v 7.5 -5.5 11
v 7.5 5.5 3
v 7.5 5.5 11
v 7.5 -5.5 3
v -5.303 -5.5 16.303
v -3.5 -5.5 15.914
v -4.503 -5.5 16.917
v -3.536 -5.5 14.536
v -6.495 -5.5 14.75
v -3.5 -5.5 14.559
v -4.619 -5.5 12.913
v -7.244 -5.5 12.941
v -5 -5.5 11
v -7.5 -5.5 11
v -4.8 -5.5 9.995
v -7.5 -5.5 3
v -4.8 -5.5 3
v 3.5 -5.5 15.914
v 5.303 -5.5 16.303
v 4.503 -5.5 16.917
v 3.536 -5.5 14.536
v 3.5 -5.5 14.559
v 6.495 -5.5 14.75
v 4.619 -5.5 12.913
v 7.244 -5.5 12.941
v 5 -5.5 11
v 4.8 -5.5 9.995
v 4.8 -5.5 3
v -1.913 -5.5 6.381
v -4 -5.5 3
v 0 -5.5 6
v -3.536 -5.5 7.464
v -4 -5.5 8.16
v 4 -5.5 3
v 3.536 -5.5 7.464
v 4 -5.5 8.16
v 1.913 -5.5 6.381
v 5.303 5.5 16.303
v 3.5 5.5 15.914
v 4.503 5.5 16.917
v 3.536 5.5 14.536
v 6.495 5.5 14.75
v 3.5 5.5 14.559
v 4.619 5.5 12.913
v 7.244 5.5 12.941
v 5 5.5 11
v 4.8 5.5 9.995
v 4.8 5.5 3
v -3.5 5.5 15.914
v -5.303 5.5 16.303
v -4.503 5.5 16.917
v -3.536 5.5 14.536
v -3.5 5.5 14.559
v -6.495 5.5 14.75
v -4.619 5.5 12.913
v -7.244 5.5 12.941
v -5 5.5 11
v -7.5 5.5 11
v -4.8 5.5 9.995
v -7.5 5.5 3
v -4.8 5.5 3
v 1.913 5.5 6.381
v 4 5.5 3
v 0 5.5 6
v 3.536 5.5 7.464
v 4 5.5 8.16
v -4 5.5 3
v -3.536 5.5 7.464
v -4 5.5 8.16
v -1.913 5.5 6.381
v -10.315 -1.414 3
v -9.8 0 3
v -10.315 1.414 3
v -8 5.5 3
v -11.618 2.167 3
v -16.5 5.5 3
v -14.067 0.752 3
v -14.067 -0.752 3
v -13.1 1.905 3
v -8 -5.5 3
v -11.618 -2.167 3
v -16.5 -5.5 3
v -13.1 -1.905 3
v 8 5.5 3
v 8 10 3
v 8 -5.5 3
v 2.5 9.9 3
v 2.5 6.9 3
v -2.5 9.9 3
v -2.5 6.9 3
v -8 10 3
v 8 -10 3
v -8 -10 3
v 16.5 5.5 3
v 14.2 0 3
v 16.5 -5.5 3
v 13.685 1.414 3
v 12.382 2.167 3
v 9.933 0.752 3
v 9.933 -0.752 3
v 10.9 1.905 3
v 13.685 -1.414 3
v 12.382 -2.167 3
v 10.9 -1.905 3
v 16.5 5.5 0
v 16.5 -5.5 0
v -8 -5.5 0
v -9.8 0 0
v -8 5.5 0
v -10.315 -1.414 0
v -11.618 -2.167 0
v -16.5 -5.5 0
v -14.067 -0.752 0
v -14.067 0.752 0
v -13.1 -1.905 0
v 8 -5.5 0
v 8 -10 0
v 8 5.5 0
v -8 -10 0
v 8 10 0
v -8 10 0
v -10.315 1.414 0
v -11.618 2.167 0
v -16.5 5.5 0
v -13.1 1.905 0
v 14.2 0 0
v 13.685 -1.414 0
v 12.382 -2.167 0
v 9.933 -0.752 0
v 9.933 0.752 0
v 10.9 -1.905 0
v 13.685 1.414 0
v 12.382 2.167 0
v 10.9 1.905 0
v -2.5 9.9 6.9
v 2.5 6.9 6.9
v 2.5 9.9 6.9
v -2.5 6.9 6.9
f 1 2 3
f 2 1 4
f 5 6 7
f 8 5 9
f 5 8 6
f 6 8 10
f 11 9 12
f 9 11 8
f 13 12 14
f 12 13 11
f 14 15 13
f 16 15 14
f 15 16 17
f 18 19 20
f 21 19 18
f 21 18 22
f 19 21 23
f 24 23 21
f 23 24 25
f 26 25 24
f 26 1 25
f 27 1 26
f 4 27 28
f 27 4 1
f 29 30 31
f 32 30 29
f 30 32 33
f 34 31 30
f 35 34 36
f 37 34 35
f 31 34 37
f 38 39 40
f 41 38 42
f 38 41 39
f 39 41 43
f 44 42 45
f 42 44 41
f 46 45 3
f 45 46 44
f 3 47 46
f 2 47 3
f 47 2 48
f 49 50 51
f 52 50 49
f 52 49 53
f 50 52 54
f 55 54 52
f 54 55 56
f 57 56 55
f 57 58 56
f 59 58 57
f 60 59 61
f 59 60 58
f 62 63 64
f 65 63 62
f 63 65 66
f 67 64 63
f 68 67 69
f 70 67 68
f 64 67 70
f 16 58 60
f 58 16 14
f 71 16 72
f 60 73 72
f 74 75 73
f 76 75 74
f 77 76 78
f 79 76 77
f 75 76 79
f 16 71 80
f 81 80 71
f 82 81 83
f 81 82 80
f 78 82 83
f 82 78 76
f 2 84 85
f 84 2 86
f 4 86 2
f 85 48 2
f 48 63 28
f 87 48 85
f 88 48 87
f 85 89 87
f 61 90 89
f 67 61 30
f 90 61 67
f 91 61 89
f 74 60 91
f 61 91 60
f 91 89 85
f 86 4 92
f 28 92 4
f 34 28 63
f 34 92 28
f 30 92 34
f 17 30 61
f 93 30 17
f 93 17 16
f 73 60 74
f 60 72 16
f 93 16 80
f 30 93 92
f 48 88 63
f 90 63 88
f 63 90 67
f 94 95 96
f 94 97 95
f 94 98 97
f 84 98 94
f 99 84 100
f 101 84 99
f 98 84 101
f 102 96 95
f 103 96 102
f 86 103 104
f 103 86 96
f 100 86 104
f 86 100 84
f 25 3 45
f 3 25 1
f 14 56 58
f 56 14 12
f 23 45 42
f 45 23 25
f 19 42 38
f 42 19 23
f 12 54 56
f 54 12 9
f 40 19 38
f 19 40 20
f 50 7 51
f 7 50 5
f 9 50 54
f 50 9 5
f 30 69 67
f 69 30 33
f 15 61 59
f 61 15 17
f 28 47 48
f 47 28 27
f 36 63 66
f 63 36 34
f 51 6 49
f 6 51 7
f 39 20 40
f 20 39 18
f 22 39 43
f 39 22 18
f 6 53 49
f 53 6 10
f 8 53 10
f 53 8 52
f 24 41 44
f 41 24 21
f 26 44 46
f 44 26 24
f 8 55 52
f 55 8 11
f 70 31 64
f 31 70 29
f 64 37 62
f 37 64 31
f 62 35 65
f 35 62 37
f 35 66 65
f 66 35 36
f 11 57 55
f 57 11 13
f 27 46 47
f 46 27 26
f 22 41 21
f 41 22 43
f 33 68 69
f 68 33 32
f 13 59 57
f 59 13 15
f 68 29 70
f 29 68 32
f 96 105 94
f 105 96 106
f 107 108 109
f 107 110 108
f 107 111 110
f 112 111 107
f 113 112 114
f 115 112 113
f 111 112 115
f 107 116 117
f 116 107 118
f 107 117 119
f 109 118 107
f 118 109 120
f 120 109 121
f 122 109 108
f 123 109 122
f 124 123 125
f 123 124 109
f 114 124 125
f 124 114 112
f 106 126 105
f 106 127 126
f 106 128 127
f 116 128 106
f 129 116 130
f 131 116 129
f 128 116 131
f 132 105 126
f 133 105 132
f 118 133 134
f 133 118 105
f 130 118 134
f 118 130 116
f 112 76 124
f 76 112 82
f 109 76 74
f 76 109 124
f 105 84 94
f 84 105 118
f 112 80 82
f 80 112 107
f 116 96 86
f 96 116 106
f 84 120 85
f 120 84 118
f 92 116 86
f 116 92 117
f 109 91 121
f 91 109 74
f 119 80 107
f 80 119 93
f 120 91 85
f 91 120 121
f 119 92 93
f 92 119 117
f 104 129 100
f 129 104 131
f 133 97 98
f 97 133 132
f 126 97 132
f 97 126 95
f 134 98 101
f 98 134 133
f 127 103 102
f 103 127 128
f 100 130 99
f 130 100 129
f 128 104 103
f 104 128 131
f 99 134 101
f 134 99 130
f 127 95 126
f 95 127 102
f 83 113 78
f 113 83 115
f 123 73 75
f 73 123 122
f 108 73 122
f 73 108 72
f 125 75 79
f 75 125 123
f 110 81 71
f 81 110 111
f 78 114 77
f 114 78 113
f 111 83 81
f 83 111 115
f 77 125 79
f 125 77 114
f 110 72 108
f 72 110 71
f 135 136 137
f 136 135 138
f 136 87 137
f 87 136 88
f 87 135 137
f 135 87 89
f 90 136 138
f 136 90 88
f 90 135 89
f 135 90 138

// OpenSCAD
// file: configuration-metric.scad
// PRUSA Mendel  
// Metric Configuration file
// GNU GPL v2
// Josef Průša
// josefprusa@me.com
// prusadjs.cz
// http://www.reprap.org/wiki/Prusa_Mendel
// http://github.com/prusajr/PrusaMendel

// CONFIGURATION FILE FOR METRIC VARIANT OF PRUSA MENDEL

// M8 rod diameter
m8_diameter = 8.4;

// M8 nut diameter diameter
// Used for $fn nut trick -> cylinder(h = 5, r=m8_nut_diameter, $fn=6, center=true);
m8_nut_diameter = 16.4;

// M4 rod/screw diameter
m4_diameter = 5;

// M4 nut diameter
// Used for $fn nut trick -> cylinder(h = 5, r=m4_nut_diameter, $fn=6, center=true);
m4_nut_diameter = 9;

// M3 rod/screw diameter
m3_diameter = 4.4;

// M3 nut diameter diameter
// Used for $fn nut trick -> cylinder(h = 5, r=m3_nut_diameter, $fn=6, center=true);
m3_nut_diameter = 7;

// Bushing holders diameter
bushing_diameter = 11;

//Motor shaft diameter
motor_shaft=5;

//Bushings
	//Size of rod on which it will slide
	bushing_rodsize = 8;
	
	//Size of whole bushings (diameter because the core is cylinder)
	bushing_outerDiameter = 16;
	
	//How long they are going to be
	bushing_lenght = 11;
	
	// TYPE Can generate three versions
	// 1 - regular old ones
	// 2 - helical ones
	// 3 - holders for brass or any other bought bushings
	bushing_type = 2;
// file: bushing.scad
// PRUSA Mendel  
// Bushings
// GNU GPL v2
// Josef Průša
// josefprusa@me.com
// prusadjs.cz
// http://www.reprap.org/wiki/Prusa_Mendel
// http://github.com/prusajr/PrusaMendel

include <configuration.scad>

/**
 * @name Bushing
 * @category Printed
 * @link bushing
 */ 

rodsize = bushing_rodsize;
outerDiameter = bushing_outerDiameter;
lenght = bushing_lenght;
type = bushing_type;


module bushing(stiff, lenght=11){
	difference(){
		union(){
			translate(v=[-7.5,-8,0])cube(size = [15,8,lenght]);
			cylinder(h = lenght, r=7.5);
		}
	//cutout inside
	//Opening
	rotate(a=[0,0,45]) translate(v=[1,1,-1]) cube(size = [16,16,lenght+2]);
	//Cutouts to make it more bendy
	if(stiff){
		translate(v=[-4.8,-6,-1]) cube(size = [0.8,6,lenght+2]);
		translate(v=[4,-6,-1]) cube(size = [0.8,6,lenght+2]);
	}else{
		translate(v=[-4.8,-8,-1]) cube(size = [0.8,8,lenght+2]);
		translate(v=[4,-8,-1]) cube(size = [0.8,8,lenght+2]);
	}
	translate(v=[0,5,(lenght+2)/2]) cube(size = [7,8,lenght+2], center=true);
	translate(v=[0,0,-1]) cylinder(h = lenght+2, r=5);
	}
}
bushing(false, 11);
translate(v=[-7,-11,0])cube(size = [14,3,11]);
// file: configuration.scad
// PRUSA Mendel  
// Configuration file
// GNU GPL v2
// Josef Průša
// josefprusa@me.com
// prusadjs.cz
// http://www.reprap.org/wiki/Prusa_Mendel
// http://github.com/prusajr/PrusaMendel

// PLESE SELECT ONE OF THE CONFIGURATION FILES
// BY UN-COMMENTING IT

// METRIC VERSION
include <configuration-metric.scad>

// IMPERIAL VERSION (TODO, just place holder)
// Spacexula will do it ;-)
// include <configuration-imperial.scad>

// MINI-HUXLEY VERSION (TODO, just place holder)
// include <configuration-huxley.scad>

// MEGA VERSION (TODO, just place holder)
// include <configuration-mega.scad>
// main file
// PRUSA Mendel  
// X-carriage
// Used for sliding on X axis
// GNU GPL v2
// Josef Průša
// josefprusa@me.com
// prusadjs.cz
// http://www.reprap.org/wiki/Prusa_Mendel
// http://github.com/prusajr/PrusaMendel

include <configuration.scad>

/**
 * @id y-bushing
 * @name Y bushing
 * @category Printed
 * @using 4 m3washer
 * @using 2 m3x15xhex
 * @using 2 m3nut
 */

snap_in_mount = false;
use <bushing.scad>

module ybushing(){
translate(v = [0,8.4,4.9]) rotate(a=[0,0,180]) cube(size = [5,3,4], center = true);difference(){
union(){
translate(v = [0,0,1.5]) cube(size = [33,11,3], center = true);
translate(v = [0,0,1.5]) cube(size = [16,20,3], center = true);

translate(v = [0,5.5,11]) rotate(a=[90,0,0]) bushing();
}
translate(v = [12, 0, -2]) cylinder(h = 12, r=m3_diameter/2, $fn=9, center=true);
translate(v = [-12, 0, -2]) cylinder(h = 12, r=m3_diameter/2, $fn=9, center=true);
}	
}
ybushing();
